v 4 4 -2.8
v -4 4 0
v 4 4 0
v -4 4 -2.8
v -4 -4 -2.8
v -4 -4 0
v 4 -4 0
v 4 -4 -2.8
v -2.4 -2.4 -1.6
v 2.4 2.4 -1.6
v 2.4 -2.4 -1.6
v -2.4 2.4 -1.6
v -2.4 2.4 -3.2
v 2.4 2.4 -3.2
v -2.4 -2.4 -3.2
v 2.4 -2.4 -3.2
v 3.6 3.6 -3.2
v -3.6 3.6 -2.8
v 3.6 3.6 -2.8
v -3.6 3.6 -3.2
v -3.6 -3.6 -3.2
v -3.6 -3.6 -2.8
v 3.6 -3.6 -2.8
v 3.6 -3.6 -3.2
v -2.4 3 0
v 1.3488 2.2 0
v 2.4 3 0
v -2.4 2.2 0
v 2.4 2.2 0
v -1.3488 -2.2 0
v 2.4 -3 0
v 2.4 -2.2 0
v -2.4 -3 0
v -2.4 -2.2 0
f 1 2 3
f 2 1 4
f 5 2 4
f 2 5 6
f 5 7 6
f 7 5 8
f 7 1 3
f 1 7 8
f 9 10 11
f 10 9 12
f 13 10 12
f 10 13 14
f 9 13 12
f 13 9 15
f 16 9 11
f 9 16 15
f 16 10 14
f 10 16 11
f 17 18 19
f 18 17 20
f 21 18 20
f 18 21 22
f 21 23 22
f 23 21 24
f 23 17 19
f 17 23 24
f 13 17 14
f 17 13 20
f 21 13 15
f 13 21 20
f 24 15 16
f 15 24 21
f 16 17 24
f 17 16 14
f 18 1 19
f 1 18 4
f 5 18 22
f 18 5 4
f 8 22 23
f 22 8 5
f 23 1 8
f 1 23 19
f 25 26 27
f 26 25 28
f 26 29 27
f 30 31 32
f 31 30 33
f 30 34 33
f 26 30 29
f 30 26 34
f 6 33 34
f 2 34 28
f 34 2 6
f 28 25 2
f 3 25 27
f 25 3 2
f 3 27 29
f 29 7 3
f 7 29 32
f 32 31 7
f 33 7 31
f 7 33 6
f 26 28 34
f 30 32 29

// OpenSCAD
// file: ../p/4-4edge.scad
use <../lib.scad>
$fa=1; $fs=0.2;
function ldraw_lib__4_4edge(realsolid=false) = [
// 0 Circle 1.0
// 0 Name: 4-4edge.dat
// 0 Author: James Jessiman
// 0 !LDRAW_ORG Primitive UPDATE 2017-01
// 0 !LICENSE Licensed under CC BY 2.0 and CC BY 4.0 : see CAreadme.txt
// 
// 0 BFC CERTIFY CCW
  [0,"BFC","CERTIFY"],
  [0,"BFC","CCW"],
// 
// 0 !HISTORY 1998-12-15 [PTadmin] Official Update 1998-10
// 0 !HISTORY 2005-12-28 [PTadmin] Official Update 2005-01
// 0 !HISTORY 2007-06-24 [PTadmin] Header formatted for Contributor Agreement
// 0 !HISTORY 2008-07-01 [PTadmin] Official Update 2008-01
// 0 !HISTORY 2017-01-15 [Steffen] BFCed
// 0 !HISTORY 2017-12-30 [PTadmin] Official Update 2017-01
// 
// 
// 2 24 1 0 0 0.9239 0 0.3827
  [2,24,1,0,0,0.9239,0,0.3827],
// 2 24 0.9239 0 0.3827 0.7071 0 0.7071
  [2,24,0.9239,0,0.3827,0.7071,0,0.7071],
// 2 24 0.7071 0 0.7071 0.3827 0 0.9239
  [2,24,0.7071,0,0.7071,0.3827,0,0.9239],
// 2 24 0.3827 0 0.9239 0 0 1
  [2,24,0.3827,0,0.9239,0,0,1],
// 2 24 0 0 1 -0.3827 0 0.9239
  [2,24,0,0,1,-0.3827,0,0.9239],
// 2 24 -0.3827 0 0.9239 -0.7071 0 0.7071
  [2,24,-0.3827,0,0.9239,-0.7071,0,0.7071],
// 2 24 -0.7071 0 0.7071 -0.9239 0 0.3827
  [2,24,-0.7071,0,0.7071,-0.9239,0,0.3827],
// 2 24 -0.9239 0 0.3827 -1 0 -0
  [2,24,-0.9239,0,0.3827,-1,0,-0],
// 2 24 -1 0 -0 -0.9239 0 -0.3827
  [2,24,-1,0,-0,-0.9239,0,-0.3827],
// 2 24 -0.9239 0 -0.3827 -0.7071 0 -0.7071
  [2,24,-0.9239,0,-0.3827,-0.7071,0,-0.7071],
// 2 24 -0.7071 0 -0.7071 -0.3827 0 -0.9239
  [2,24,-0.7071,0,-0.7071,-0.3827,0,-0.9239],
// 2 24 -0.3827 0 -0.9239 0 0 -1
  [2,24,-0.3827,0,-0.9239,0,0,-1],
// 2 24 0 0 -1 0.3827 0 -0.9239
  [2,24,0,0,-1,0.3827,0,-0.9239],
// 2 24 0.3827 0 -0.9239 0.7071 0 -0.7071
  [2,24,0.3827,0,-0.9239,0.7071,0,-0.7071],
// 2 24 0.7071 0 -0.7071 0.9239 0 -0.3827
  [2,24,0.7071,0,-0.7071,0.9239,0,-0.3827],
// 2 24 0.9239 0 -0.3827 1 0 0
  [2,24,0.9239,0,-0.3827,1,0,0],
];
module ldraw_lib__4_4edge(step=0, col=false, unit=2/5, alt=false, line=0.2, solid=!$preview)
    makepoly(ldraw_lib__4_4edge(solid), step=step, col=col, unit=unit, alt=alt, line=line, solid=solid);
ldraw_lib__4_4edge(line=0.2);
// file: ../p/4-4disc.scad
use <../lib.scad>
$fa=1; $fs=0.2;
function ldraw_lib__4_4disc(realsolid=false) = [
// 0 Disc 1.0
// 0 Name: 4-4disc.dat
// 0 Author: James Jessiman
// 0 !LDRAW_ORG Primitive UPDATE 2002-02
// 0 !LICENSE Licensed under CC BY 2.0 and CC BY 4.0 : see CAreadme.txt
// 
// 0 BFC CERTIFY CCW
  [0,"BFC","CERTIFY"],
  [0,"BFC","CCW"],
// 
// 0 !HISTORY 1998-12-15 [PTadmin] Official Update 1998-10
// 0 !HISTORY 2002-03-23 [sbliss] Added BFC statement
// 0 !HISTORY 2002-04-25 [PTadmin] Official Update 2002-02
// 0 !HISTORY 2007-06-24 [PTadmin] Header formatted for Contributor Agreement
// 0 !HISTORY 2008-07-01 [PTadmin] Official Update 2008-01
// 
// 
// 3 16 0 0 0 1 0 0 0.9239 0 0.3827
  [3,16,0,0,0,1,0,0,0.9239,0,0.3827],
// 3 16 0 0 0 0.9239 0 0.3827 0.7071 0 0.7071
  [3,16,0,0,0,0.9239,0,0.3827,0.7071,0,0.7071],
// 3 16 0 0 0 0.7071 0 0.7071 0.3827 0 0.9239
  [3,16,0,0,0,0.7071,0,0.7071,0.3827,0,0.9239],
// 3 16 0 0 0 0.3827 0 0.9239 0 0 1
  [3,16,0,0,0,0.3827,0,0.9239,0,0,1],
// 3 16 0 0 0 0 0 1 -0.3827 0 0.9239
  [3,16,0,0,0,0,0,1,-0.3827,0,0.9239],
// 3 16 0 0 0 -0.3827 0 0.9239 -0.7071 0 0.7071
  [3,16,0,0,0,-0.3827,0,0.9239,-0.7071,0,0.7071],
// 3 16 0 0 0 -0.7071 0 0.7071 -0.9239 0 0.3827
  [3,16,0,0,0,-0.7071,0,0.7071,-0.9239,0,0.3827],
// 3 16 0 0 0 -0.9239 0 0.3827 -1 0 -0
  [3,16,0,0,0,-0.9239,0,0.3827,-1,0,-0],
// 3 16 0 0 0 -1 0 -0 -0.9239 0 -0.3827
  [3,16,0,0,0,-1,0,-0,-0.9239,0,-0.3827],
// 3 16 0 0 0 -0.9239 0 -0.3827 -0.7071 0 -0.7071
  [3,16,0,0,0,-0.9239,0,-0.3827,-0.7071,0,-0.7071],
// 3 16 0 0 0 -0.7071 0 -0.7071 -0.3827 0 -0.9239
  [3,16,0,0,0,-0.7071,0,-0.7071,-0.3827,0,-0.9239],
// 3 16 0 0 0 -0.3827 0 -0.9239 0 0 -1
  [3,16,0,0,0,-0.3827,0,-0.9239,0,0,-1],
// 3 16 0 0 0 0 0 -1 0.3827 0 -0.9239
  [3,16,0,0,0,0,0,-1,0.3827,0,-0.9239],
// 3 16 0 0 0 0.3827 0 -0.9239 0.7071 0 -0.7071
  [3,16,0,0,0,0.3827,0,-0.9239,0.7071,0,-0.7071],
// 3 16 0 0 0 0.7071 0 -0.7071 0.9239 0 -0.3827
  [3,16,0,0,0,0.7071,0,-0.7071,0.9239,0,-0.3827],
// 3 16 0 0 0 0.9239 0 -0.3827 1 0 0
  [3,16,0,0,0,0.9239,0,-0.3827,1,0,0],
// 0
];
module ldraw_lib__4_4disc(step=0, col=false, unit=2/5, alt=false, line=0.2, solid=!$preview)
    makepoly(ldraw_lib__4_4disc(solid), step=step, col=col, unit=unit, alt=alt, line=line, solid=solid);
ldraw_lib__4_4disc(line=0.2);
// file: ../p/4-4cyli.scad
use <../lib.scad>
$fa=1; $fs=0.2;
function ldraw_lib__4_4cyli(realsolid=false) = [
// 0 Cylinder 1.0
// 0 Name: 4-4cyli.dat
// 0 Author: James Jessiman
// 0 !LDRAW_ORG Primitive UPDATE 2005-01
// 0 !LICENSE Licensed under CC BY 2.0 and CC BY 4.0 : see CAreadme.txt
// 
// 0 BFC CERTIFY CCW
  [0,"BFC","CERTIFY"],
  [0,"BFC","CCW"],
// 
// 0 !HISTORY 1998-12-15 [PTadmin] Official Update 1998-10
// 0 !HISTORY 2002-03-23 [sbliss] Added BFC statement; merged headers from files in distributions LDraw 0.27 and Complete.
// 0 !HISTORY 2002-04-25 [PTadmin] Official Update 2002-02
// 0 !HISTORY 2004-12-14 [guyvivan] BFC CCW
// 0 !HISTORY 2005-12-28 [PTadmin] Official Update 2005-01
// 0 !HISTORY 2007-06-24 [PTadmin] Header formatted for Contributor Agreement
// 0 !HISTORY 2008-07-01 [PTadmin] Official Update 2008-01
// 
// 
// 4 16 1 1 0 0.9239 1 0.3827 0.9239 0 0.3827 1 0 0
  [4,16,1,1,0,0.9239,1,0.3827,0.9239,0,0.3827,1,0,0],
// 5 24 1 0 0 1 1 0 0.9239 0 0.3827 0.9239 0 -0.3827
  [5,24,1,0,0,1,1,0,0.9239,0,0.3827,0.9239,0,-0.3827],
// 4 16 0.9239 1 0.3827 0.7071 1 0.7071 0.7071 0 0.7071 0.9239 0 0.3827
  [4,16,0.9239,1,0.3827,0.7071,1,0.7071,0.7071,0,0.7071,0.9239,0,0.3827],
// 5 24 0.9239 0 0.3827 0.9239 1 0.3827 0.7071 0 0.7071 1 0 0
  [5,24,0.9239,0,0.3827,0.9239,1,0.3827,0.7071,0,0.7071,1,0,0],
// 4 16 0.7071 1 0.7071 0.3827 1 0.9239 0.3827 0 0.9239 0.7071 0 0.7071
  [4,16,0.7071,1,0.7071,0.3827,1,0.9239,0.3827,0,0.9239,0.7071,0,0.7071],
// 5 24 0.7071 0 0.7071 0.7071 1 0.7071 0.3827 0 0.9239 0.9239 0 0.3827
  [5,24,0.7071,0,0.7071,0.7071,1,0.7071,0.3827,0,0.9239,0.9239,0,0.3827],
// 4 16 0.3827 1 0.9239 0 1 1 0 0 1 0.3827 0 0.9239
  [4,16,0.3827,1,0.9239,0,1,1,0,0,1,0.3827,0,0.9239],
// 5 24 0.3827 0 0.9239 0.3827 1 0.9239 0 0 1 0.7071 0 0.7071
  [5,24,0.3827,0,0.9239,0.3827,1,0.9239,0,0,1,0.7071,0,0.7071],
// 4 16 0 1 1 -0.3827 1 0.9239 -0.3827 0 0.9239 0 0 1
  [4,16,0,1,1,-0.3827,1,0.9239,-0.3827,0,0.9239,0,0,1],
// 5 24 0 0 1 0 1 1 -0.3827 0 0.9239 0.3827 0 0.9239
  [5,24,0,0,1,0,1,1,-0.3827,0,0.9239,0.3827,0,0.9239],
// 4 16 -0.3827 1 0.9239 -0.7071 1 0.7071 -0.7071 0 0.7071 -0.3827 0 0.9239
  [4,16,-0.3827,1,0.9239,-0.7071,1,0.7071,-0.7071,0,0.7071,-0.3827,0,0.9239],
// 5 24 -0.3827 0 0.9239 -0.3827 1 0.9239 -0.7071 0 0.7071 0 0 1
  [5,24,-0.3827,0,0.9239,-0.3827,1,0.9239,-0.7071,0,0.7071,0,0,1],
// 4 16 -0.7071 1 0.7071 -0.9239 1 0.3827 -0.9239 0 0.3827 -0.7071 0 0.7071
  [4,16,-0.7071,1,0.7071,-0.9239,1,0.3827,-0.9239,0,0.3827,-0.7071,0,0.7071],
// 5 24 -0.7071 0 0.7071 -0.7071 1 0.7071 -0.9239 0 0.3827 -0.3827 0 0.9239
  [5,24,-0.7071,0,0.7071,-0.7071,1,0.7071,-0.9239,0,0.3827,-0.3827,0,0.9239],
// 4 16 -0.9239 1 0.3827 -1 1 0 -1 0 0 -0.9239 0 0.3827
  [4,16,-0.9239,1,0.3827,-1,1,0,-1,0,0,-0.9239,0,0.3827],
// 5 24 -0.9239 0 0.3827 -0.9239 1 0.3827 -1 0 0 -0.7071 0 0.7071
  [5,24,-0.9239,0,0.3827,-0.9239,1,0.3827,-1,0,0,-0.7071,0,0.7071],
// 4 16 -1 1 0 -0.9239 1 -0.3827 -0.9239 0 -0.3827 -1 0 0
  [4,16,-1,1,0,-0.9239,1,-0.3827,-0.9239,0,-0.3827,-1,0,0],
// 5 24 -1 0 0 -1 1 0 -0.9239 0 -0.3827 -0.9239 0 0.3827
  [5,24,-1,0,0,-1,1,0,-0.9239,0,-0.3827,-0.9239,0,0.3827],
// 4 16 -0.9239 1 -0.3827 -0.7071 1 -0.7071 -0.7071 0 -0.7071 -0.9239 0 -0.3827
  [4,16,-0.9239,1,-0.3827,-0.7071,1,-0.7071,-0.7071,0,-0.7071,-0.9239,0,-0.3827],
// 5 24 -0.9239 0 -0.3827 -0.9239 1 -0.3827 -0.7071 0 -0.7071 -1 0 0
  [5,24,-0.9239,0,-0.3827,-0.9239,1,-0.3827,-0.7071,0,-0.7071,-1,0,0],
// 4 16 -0.7071 1 -0.7071 -0.3827 1 -0.9239 -0.3827 0 -0.9239 -0.7071 0 -0.7071
  [4,16,-0.7071,1,-0.7071,-0.3827,1,-0.9239,-0.3827,0,-0.9239,-0.7071,0,-0.7071],
// 5 24 -0.7071 0 -0.7071 -0.7071 1 -0.7071 -0.3827 0 -0.9239 -0.9239 0 -0.3827
  [5,24,-0.7071,0,-0.7071,-0.7071,1,-0.7071,-0.3827,0,-0.9239,-0.9239,0,-0.3827],
// 4 16 -0.3827 1 -0.9239 0 1 -1 0 0 -1 -0.3827 0 -0.9239
  [4,16,-0.3827,1,-0.9239,0,1,-1,0,0,-1,-0.3827,0,-0.9239],
// 5 24 -0.3827 0 -0.9239 -0.3827 1 -0.9239 0 0 -1 -0.7071 0 -0.7071
  [5,24,-0.3827,0,-0.9239,-0.3827,1,-0.9239,0,0,-1,-0.7071,0,-0.7071],
// 4 16 0 1 -1 0.3827 1 -0.9239 0.3827 0 -0.9239 0 0 -1
  [4,16,0,1,-1,0.3827,1,-0.9239,0.3827,0,-0.9239,0,0,-1],
// 5 24 0 0 -1 0 1 -1 0.3827 0 -0.9239 -0.3827 0 -0.9239
  [5,24,0,0,-1,0,1,-1,0.3827,0,-0.9239,-0.3827,0,-0.9239],
// 4 16 0.3827 1 -0.9239 0.7071 1 -0.7071 0.7071 0 -0.7071 0.3827 0 -0.9239
  [4,16,0.3827,1,-0.9239,0.7071,1,-0.7071,0.7071,0,-0.7071,0.3827,0,-0.9239],
// 5 24 0.3827 0 -0.9239 0.3827 1 -0.9239 0.7071 0 -0.7071 0 0 -1
  [5,24,0.3827,0,-0.9239,0.3827,1,-0.9239,0.7071,0,-0.7071,0,0,-1],
// 4 16 0.7071 1 -0.7071 0.9239 1 -0.3827 0.9239 0 -0.3827 0.7071 0 -0.7071
  [4,16,0.7071,1,-0.7071,0.9239,1,-0.3827,0.9239,0,-0.3827,0.7071,0,-0.7071],
// 5 24 0.7071 0 -0.7071 0.7071 1 -0.7071 0.9239 0 -0.3827 0.3827 0 -0.9239
  [5,24,0.7071,0,-0.7071,0.7071,1,-0.7071,0.9239,0,-0.3827,0.3827,0,-0.9239],
// 4 16 0.9239 1 -0.3827 1 1 0 1 0 0 0.9239 0 -0.3827
  [4,16,0.9239,1,-0.3827,1,1,0,1,0,0,0.9239,0,-0.3827],
// 5 24 0.9239 0 -0.3827 0.9239 1 -0.3827 1 0 0 0.7071 0 -0.7071
  [5,24,0.9239,0,-0.3827,0.9239,1,-0.3827,1,0,0,0.7071,0,-0.7071],
// 0
];
module ldraw_lib__4_4cyli(step=0, col=false, unit=2/5, alt=false, line=0.2, solid=!$preview)
    makepoly(ldraw_lib__4_4cyli(solid), step=step, col=col, unit=unit, alt=alt, line=line, solid=solid);
ldraw_lib__4_4cyli(line=0.2);
// file: ../p/stud3.scad
use <../lib.scad>
use <4-4cyli.scad>
use <4-4disc.scad>
use <4-4edge.scad>
$fa=1; $fs=0.2;
function ldraw_lib__stud3(realsolid=false) = realsolid ? 
    [openscad(translate([0,0,-eps()], o=cylinder(4+eps(), r=4)),2)] : [
// 0 Stud Tube Solid
// 0 Name: stud3.dat
// 0 Author: James Jessiman
// 0 !LDRAW_ORG Primitive UPDATE 2012-01
// 0 !LICENSE Licensed under CC BY 2.0 and CC BY 4.0 : see CAreadme.txt
// 
// 0 BFC CERTIFY CCW
  [0,"BFC","CERTIFY"],
  [0,"BFC","CCW"],
// 
// 0 !HISTORY 2002-04-04 [sbliss] Modified for BFC compliance
// 0 !HISTORY 2002-04-25 [PTadmin] Official Update 2002-02
// 0 !HISTORY 2007-06-24 [PTadmin] Header formatted for Contributor Agreement
// 0 !HISTORY 2008-07-01 [PTadmin] Official Update 2008-01
// 0 !HISTORY 2012-02-16 [Philo] Changed to CCW
// 0 !HISTORY 2012-03-30 [PTadmin] Official Update 2012-01
// 
// 
// 1 16 0 -4 0 4 0 0 0 1 0 0 0 4 4-4edge.dat
  [1,16,0,-4,0,4,0,0,0,1,0,0,0,4, ldraw_lib__4_4edge(realsolid)],
// 1 16 0 0 0 4 0 0 0 1 0 0 0 4 4-4edge.dat
  [1,16,0,0,0,4,0,0,0,1,0,0,0,4, ldraw_lib__4_4edge(realsolid)],
// 1 16 0 -4 0 4 0 0 0 1 0 0 0 4 4-4disc.dat
  [1,16,0,-4,0,4,0,0,0,1,0,0,0,4, ldraw_lib__4_4disc(realsolid)],
// 1 16 0 -4 0 4 0 0 0 4 0 0 0 4 4-4cyli.dat
  [1,16,0,-4,0,4,0,0,0,4,0,0,0,4, ldraw_lib__4_4cyli(realsolid)],
];
module ldraw_lib__stud3(step=0, col=false, unit=2/5, alt=false, line=0.2, solid=!$preview)
    makepoly(ldraw_lib__stud3(solid), step=step, col=col, unit=unit, alt=alt, line=line, solid=solid);
ldraw_lib__stud3(line=0.2);
// file: ../p/stud.scad
use <../lib.scad>
use <4-4cyli.scad>
use <4-4disc.scad>
use <4-4edge.scad>
$fa=1; $fs=0.2;
function ldraw_lib__stud(realsolid=false) = realsolid ? 
    [openscad(translate([0,0,-eps()], o=cylinder(4+eps(), r=6)),2)] : [
// 0 Stud
// 0 Name: stud.dat
// 0 Author: James Jessiman
// 0 !LDRAW_ORG Primitive UPDATE 2012-01
// 0 !LICENSE Licensed under CC BY 2.0 and CC BY 4.0 : see CAreadme.txt
// 
// 0 BFC CERTIFY CCW
  [0,"BFC","CERTIFY"],
  [0,"BFC","CCW"],
// 
// 0 !HISTORY 2002-04-04 [sbliss] Modified for BFC compliance
// 0 !HISTORY 2002-04-25 [PTadmin] Official Update 2002-02
// 0 !HISTORY 2007-06-24 [PTadmin] Header formatted for Contributor Agreement
// 0 !HISTORY 2008-07-01 [PTadmin] Official Update 2008-01
// 0 !HISTORY 2012-02-16 [Philo] Changed to CCW
// 0 !HISTORY 2012-03-30 [PTadmin] Official Update 2012-01
// 
// 
// 1 16 0 0 0 6 0 0 0 1 0 0 0 6 4-4edge.dat
  [1,16,0,0,0,6,0,0,0,1,0,0,0,6, ldraw_lib__4_4edge(realsolid)],
// 1 16 0 -4 0 6 0 0 0 1 0 0 0 6 4-4edge.dat
  [1,16,0,-4,0,6,0,0,0,1,0,0,0,6, ldraw_lib__4_4edge(realsolid)],
// 1 16 0 0 0 6 0 0 0 -4 0 0 0 6 4-4cyli.dat
  [1,16,0,0,0,6,0,0,0,-4,0,0,0,6, ldraw_lib__4_4cyli(realsolid)],
// 1 16 0 -4 0 6 0 0 0 1 0 0 0 6 4-4disc.dat
  [1,16,0,-4,0,6,0,0,0,1,0,0,0,6, ldraw_lib__4_4disc(realsolid)],
];
module ldraw_lib__stud(step=0, col=false, unit=2/5, alt=false, line=0.2, solid=!$preview)
    makepoly(ldraw_lib__stud(solid), step=step, col=col, unit=unit, alt=alt, line=line, solid=solid);
ldraw_lib__stud(line=0.2);
// file: ../p/box4t.scad
use <../lib.scad>
$fa=1; $fs=0.2;
function ldraw_lib__box4t(realsolid=false) = [
// 0 Box with 4 Adjacent Faces and All Edges
// 0 Name: box4t.dat
// 0 Author: Tore Eriksson [Tore_Eriksson]
// 0 !LDRAW_ORG Primitive UPDATE 2003-02
// 0 !LICENSE Licensed under CC BY 2.0 and CC BY 4.0 : see CAreadme.txt
// 
// 0 BFC CERTIFY CCW
  [0,"BFC","CERTIFY"],
  [0,"BFC","CCW"],
// 
// 0 !HISTORY 1997-09-29 [PTadmin] Official Update 1997-15
// 0 !HISTORY 2002-08-31 [izanette] Modified with WINDZ for BFC compliance
// 0 !HISTORY 2003-08-01 [PTadmin] Official Update 2003-02
// 0 !HISTORY 2007-06-24 [PTadmin] Header formatted for Contributor Agreement
// 0 !HISTORY 2008-07-01 [PTadmin] Official Update 2008-01
// 
// 
// 2 24 1 1 1 -1 1 1
  [2,24,1,1,1,-1,1,1],
// 2 24 -1 1 1 -1 1 -1
  [2,24,-1,1,1,-1,1,-1],
// 2 24 -1 1 -1 1 1 -1
  [2,24,-1,1,-1,1,1,-1],
// 2 24 1 1 -1 1 1 1
  [2,24,1,1,-1,1,1,1],
// 2 24 1 0 1 -1 0 1
  [2,24,1,0,1,-1,0,1],
// 2 24 -1 0 1 -1 0 -1
  [2,24,-1,0,1,-1,0,-1],
// 2 24 -1 0 -1 1 0 -1
  [2,24,-1,0,-1,1,0,-1],
// 2 24 1 0 -1 1 0 1
  [2,24,1,0,-1,1,0,1],
// 2 24 1 0 1 1 1 1
  [2,24,1,0,1,1,1,1],
// 2 24 -1 0 1 -1 1 1
  [2,24,-1,0,1,-1,1,1],
// 2 24 1 0 -1 1 1 -1
  [2,24,1,0,-1,1,1,-1],
// 2 24 -1 0 -1 -1 1 -1
  [2,24,-1,0,-1,-1,1,-1],
// 4 16 1 1 1 1 1 -1 -1 1 -1 -1 1 1
  [4,16,1,1,1,1,1,-1,-1,1,-1,-1,1,1],
// 4 16 1 1 1 -1 1 1 -1 0 1 1 0 1
  [4,16,1,1,1,-1,1,1,-1,0,1,1,0,1],
// 4 16 -1 1 1 -1 1 -1 -1 0 -1 -1 0 1
  [4,16,-1,1,1,-1,1,-1,-1,0,-1,-1,0,1],
// 0 4 16 -1 1 -1 -1 0 -1 1 0 -1 1 1 -1
// 4 16 1 1 -1 1 1 1 1 0 1 1 0 -1
  [4,16,1,1,-1,1,1,1,1,0,1,1,0,-1],
// 0
];
module ldraw_lib__box4t(step=0, col=false, unit=2/5, alt=false, line=0.2, solid=!$preview)
    makepoly(ldraw_lib__box4t(solid), step=step, col=col, unit=unit, alt=alt, line=line, solid=solid);
ldraw_lib__box4t(line=0.2);
// file: s/3004s01.scad
use <../../lib.scad>
use <../../p/box4t.scad>
use <../../p/box5.scad>
use <../../p/stud.scad>
use <../../p/stud3.scad>
$fa=1; $fs=0.2;
function ldraw_lib__s__3004s01(realsolid=false) = [
// 0 ~Brick  1 x  2 without Front Face
// 0 Name: s\3004s01.dat
// 0 Author: James Jessiman
// 0 !LDRAW_ORG Subpart UPDATE 2003-03
// 0 !LICENSE Licensed under CC BY 2.0 and CC BY 4.0 : see CAreadme.txt
// 
// 0 BFC CERTIFY CCW
  [0,"BFC","CERTIFY"],
  [0,"BFC","CCW"],
// 
// 0 !HISTORY 2003-09-07 [jriley] Subfiling, BFC
// 0 !HISTORY 2003-12-19 [PTadmin] Official Update 2003-03
// 0 !HISTORY 2007-08-29 [PTadmin] Header formatted for Contributor Agreement
// 0 !HISTORY 2008-07-01 [PTadmin] Official Update 2008-01
// 
// 
// 1 16 0 4 0 1 0 0 0 -5 0 0 0 1 stud3.dat
  [1,16,0,4,0,1,0,0,0,-5,0,0,0,1, ldraw_lib__stud3(realsolid)],
// 0 BFC INVERTNEXT
  [0,"BFC","INVERTNEXT"],
// 1 16 0 24 0 16 0 0 0 -20 0 0 0 6 box5.dat
  [1,16,0,24,0,16,0,0,0,-20,0,0,0,6, ldraw_lib__box5(realsolid)],
// 4 16 20 24 10 16 24 6 -16 24 6 -20 24 10
  [4,16,20,24,10,16,24,6,-16,24,6,-20,24,10],
// 4 16 -20 24 10 -16 24 6 -16 24 -6 -20 24 -10
  [4,16,-20,24,10,-16,24,6,-16,24,-6,-20,24,-10],
// 4 16 -20 24 -10 -16 24 -6 16 24 -6 20 24 -10
  [4,16,-20,24,-10,-16,24,-6,16,24,-6,20,24,-10],
// 4 16 20 24 -10 16 24 -6 16 24 6 20 24 10
  [4,16,20,24,-10,16,24,-6,16,24,6,20,24,10],
// 1 16 0 24 0 20 0 0 0 -24 0 0 0 10 box4t.dat
  [1,16,0,24,0,20,0,0,0,-24,0,0,0,10, ldraw_lib__box4t(realsolid)],
// 1 16 10 0 0 1 0 0 0 1 0 0 0 1 stud.dat
  [1,16,10,0,0,1,0,0,0,1,0,0,0,1, ldraw_lib__stud(realsolid)],
// 1 16 -10 0 0 1 0 0 0 1 0 0 0 1 stud.dat
  [1,16,-10,0,0,1,0,0,0,1,0,0,0,1, ldraw_lib__stud(realsolid)],
// 0
];
module ldraw_lib__s__3004s01(step=0, col=false, unit=2/5, alt=false, line=0.2, solid=!$preview)
    makepoly(ldraw_lib__s__3004s01(solid), step=step, col=col, unit=unit, alt=alt, line=line, solid=solid);
ldraw_lib__s__3004s01(line=0.2);
// file: ../p/box5.scad
use <../lib.scad>
$fa=1; $fs=0.2;
function ldraw_lib__box5(realsolid=false) = [
// 0 Box with 5 Faces and All Edges
// 0 Name: box5.dat
// 0 Author: James Jessiman
// 0 !LDRAW_ORG Primitive UPDATE 2012-01
// 0 !LICENSE Licensed under CC BY 2.0 and CC BY 4.0 : see CAreadme.txt
// 
// 0 BFC CERTIFY CCW
  [0,"BFC","CERTIFY"],
  [0,"BFC","CCW"],
// 
// 0 !HISTORY 2002-04-03 [sbliss] Modified for BFC compliance
// 0 !HISTORY 2002-04-25 [PTadmin] Official Update 2002-02
// 0 !HISTORY 2007-06-24 [PTadmin] Header formatted for Contributor Agreement
// 0 !HISTORY 2008-07-01 [PTadmin] Official Update 2008-01
// 0 !HISTORY 2012-02-16 [Philo] Changed to CCW
// 0 !HISTORY 2012-03-30 [PTadmin] Official Update 2012-01
// 
// 
// 2 24 1 1 1 -1 1 1
  [2,24,1,1,1,-1,1,1],
// 2 24 -1 1 1 -1 1 -1
  [2,24,-1,1,1,-1,1,-1],
// 2 24 -1 1 -1 1 1 -1
  [2,24,-1,1,-1,1,1,-1],
// 2 24 1 1 -1 1 1 1
  [2,24,1,1,-1,1,1,1],
// 2 24 1 0 1 -1 0 1
  [2,24,1,0,1,-1,0,1],
// 2 24 -1 0 1 -1 0 -1
  [2,24,-1,0,1,-1,0,-1],
// 2 24 -1 0 -1 1 0 -1
  [2,24,-1,0,-1,1,0,-1],
// 2 24 1 0 -1 1 0 1
  [2,24,1,0,-1,1,0,1],
// 2 24 1 0 1 1 1 1
  [2,24,1,0,1,1,1,1],
// 2 24 -1 0 1 -1 1 1
  [2,24,-1,0,1,-1,1,1],
// 2 24 1 0 -1 1 1 -1
  [2,24,1,0,-1,1,1,-1],
// 2 24 -1 0 -1 -1 1 -1
  [2,24,-1,0,-1,-1,1,-1],
// 4 16 -1 1 1 1 1 1 1 1 -1 -1 1 -1
  [4,16,-1,1,1,1,1,1,1,1,-1,-1,1,-1],
// 4 16 -1 1 1 -1 0 1 1 0 1 1 1 1
  [4,16,-1,1,1,-1,0,1,1,0,1,1,1,1],
// 4 16 -1 1 -1 -1 0 -1 -1 0 1 -1 1 1
  [4,16,-1,1,-1,-1,0,-1,-1,0,1,-1,1,1],
// 4 16 1 1 -1 1 0 -1 -1 0 -1 -1 1 -1
  [4,16,1,1,-1,1,0,-1,-1,0,-1,-1,1,-1],
// 4 16 1 1 1 1 0 1 1 0 -1 1 1 -1
  [4,16,1,1,1,1,0,1,1,0,-1,1,1,-1],
];
module ldraw_lib__box5(step=0, col=false, unit=2/5, alt=false, line=0.2, solid=!$preview)
    makepoly(ldraw_lib__box5(solid), step=step, col=col, unit=unit, alt=alt, line=line, solid=solid);
ldraw_lib__box5(line=0.2);
// file: ../p/box4.scad
use <../lib.scad>
$fa=1; $fs=0.2;
function ldraw_lib__box4(realsolid=false) = [
// 0 Box with 4 Faces (2 Parallel Pairs) and All Edges
// 0 Name: box4.dat
// 0 Author: James Jessiman
// 0 !LDRAW_ORG Primitive UPDATE 2012-01
// 0 !LICENSE Licensed under CC BY 2.0 and CC BY 4.0 : see CAreadme.txt
// 
// 0 BFC CERTIFY CCW
  [0,"BFC","CERTIFY"],
  [0,"BFC","CCW"],
// 
// 0 !HISTORY 2002-04-03 [sbliss] Modified for BFC compliance
// 0 !HISTORY 2002-04-25 [PTadmin] Official Update 2002-02
// 0 !HISTORY 2007-06-24 [PTadmin] Header formatted for Contributor Agreement
// 0 !HISTORY 2008-07-01 [PTadmin] Official Update 2008-01
// 0 !HISTORY 2012-02-16 [Philo] Changed to CCW
// 0 !HISTORY 2012-03-30 [PTadmin] Official Update 2012-01
// 
// 
// 2 24 1 1 1 -1 1 1
  [2,24,1,1,1,-1,1,1],
// 2 24 -1 1 1 -1 1 -1
  [2,24,-1,1,1,-1,1,-1],
// 2 24 -1 1 -1 1 1 -1
  [2,24,-1,1,-1,1,1,-1],
// 2 24 1 1 -1 1 1 1
  [2,24,1,1,-1,1,1,1],
// 2 24 1 0 1 -1 0 1
  [2,24,1,0,1,-1,0,1],
// 2 24 -1 0 1 -1 0 -1
  [2,24,-1,0,1,-1,0,-1],
// 2 24 -1 0 -1 1 0 -1
  [2,24,-1,0,-1,1,0,-1],
// 2 24 1 0 -1 1 0 1
  [2,24,1,0,-1,1,0,1],
// 2 24 1 0 1 1 1 1
  [2,24,1,0,1,1,1,1],
// 2 24 -1 0 1 -1 1 1
  [2,24,-1,0,1,-1,1,1],
// 2 24 1 0 -1 1 1 -1
  [2,24,1,0,-1,1,1,-1],
// 2 24 -1 0 -1 -1 1 -1
  [2,24,-1,0,-1,-1,1,-1],
// 4 16 -1 1 1 -1 0 1 1 0 1 1 1 1
  [4,16,-1,1,1,-1,0,1,1,0,1,1,1,1],
// 4 16 -1 1 -1 -1 0 -1 -1 0 1 -1 1 1
  [4,16,-1,1,-1,-1,0,-1,-1,0,1,-1,1,1],
// 4 16 1 1 -1 1 0 -1 -1 0 -1 -1 1 -1
  [4,16,1,1,-1,1,0,-1,-1,0,-1,-1,1,-1],
// 4 16 1 1 1 1 0 1 1 0 -1 1 1 -1
  [4,16,1,1,1,1,0,1,1,0,-1,1,1,-1],
];
module ldraw_lib__box4(step=0, col=false, unit=2/5, alt=false, line=0.2, solid=!$preview)
    makepoly(ldraw_lib__box4(solid), step=step, col=col, unit=unit, alt=alt, line=line, solid=solid);
ldraw_lib__box4(line=0.2);
// file: 3004.scad
use <../lib.scad>
use <s/3004s01.scad>
$fa=1; $fs=0.2;
function ldraw_lib__3004(realsolid=false) = [
// 0 Brick  1 x  2
// 0 Name: 3004.dat
// 0 Author: James Jessiman
// 0 !LDRAW_ORG Part UPDATE 2022-05
// 0 !LICENSE Licensed under CC BY 2.0 and CC BY 4.0 : see CAreadme.txt
// 
// 0 BFC CERTIFY CCW
  [0,"BFC","CERTIFY"],
  [0,"BFC","CCW"],
// 
// 0 !HISTORY 2001-10-26 [PTadmin] Official Update 2001-01
// 0 !HISTORY 2002-05-07 {unknown} BFC Certification
// 0 !HISTORY 2002-06-11 [PTadmin] Official Update 2002-03
// 0 !HISTORY 2007-05-07 [PTadmin] Header formatted for Contributor Agreement
// 0 !HISTORY 2008-07-01 [PTadmin] Official Update 2008-01
// 0 !HISTORY 2022-08-04 [MagFors] Using subfile
// 0 !HISTORY 2022-09-15 [PTadmin] Official Update 2022-05
// 
// 
// 1 16 0 0 0 1 0 0 0 1 0 0 0 1 s\3004s01.dat
  [1,16,0,0,0,1,0,0,0,1,0,0,0,1, ldraw_lib__s__3004s01(realsolid)],
// 4 16 -20 24 -10 20 24 -10 20 0 -10 -20 0 -10
  [4,16,-20,24,-10,20,24,-10,20,0,-10,-20,0,-10],
];
module ldraw_lib__3004(step=0, col=false, unit=2/5, alt=false, line=0.2, solid=!$preview)
    makepoly(ldraw_lib__3004(solid), step=step, col=col, unit=unit, alt=alt, line=line, solid=solid);
ldraw_lib__3004(line=0.2);
// file: s/3070bs01.scad
use <../../lib.scad>
use <../../p/box4.scad>
use <../../p/box5.scad>
$fa=1; $fs=0.2;
function ldraw_lib__s__3070bs01(realsolid=false) = [
// 0 ~Tile  1 x  1 with Groove without Top Face
// 0 Name: s\3070bs01.dat
// 0 Author: Chris Dee [cwdee]
// 0 !LDRAW_ORG Subpart UPDATE 2009-02
// 0 !LICENSE Licensed under CC BY 2.0 and CC BY 4.0 : see CAreadme.txt
// 
// 0 BFC CERTIFY CCW
  [0,"BFC","CERTIFY"],
  [0,"BFC","CCW"],
// 
// 0 !HISTORY 2009-09-03 [PTadmin] Official Update 2009-02
// 
// 
// 1 16 0 0 0 10 0 0 0 7 0 0 0 10 box4.dat
  [1,16,0,0,0,10,0,0,0,7,0,0,0,10, ldraw_lib__box4(realsolid)],
// 0 BFC INVERTNEXT
  [0,"BFC","INVERTNEXT"],
// 1 16 0 8 0 6 0 0 0 -4 0 0 0 6 box5.dat
  [1,16,0,8,0,6,0,0,0,-4,0,0,0,6, ldraw_lib__box5(realsolid)],
// 1 16 0 7 0 9 0 0 0 1 0 0 0 9 box4.dat
  [1,16,0,7,0,9,0,0,0,1,0,0,0,9, ldraw_lib__box4(realsolid)],
// 
// 4 16 9 8 9 6 8 6 -6 8 6 -9 8 9
  [4,16,9,8,9,6,8,6,-6,8,6,-9,8,9],
// 4 16 -9 8 9 -6 8 6 -6 8 -6 -9 8 -9
  [4,16,-9,8,9,-6,8,6,-6,8,-6,-9,8,-9],
// 4 16 -9 8 -9 -6 8 -6 6 8 -6 9 8 -9
  [4,16,-9,8,-9,-6,8,-6,6,8,-6,9,8,-9],
// 4 16 9 8 -9 6 8 -6 6 8 6 9 8 9
  [4,16,9,8,-9,6,8,-6,6,8,6,9,8,9],
// 
// 4 16 10 7 10 9 7 9 -9 7 9 -10 7 10
  [4,16,10,7,10,9,7,9,-9,7,9,-10,7,10],
// 4 16 -10 7 10 -9 7 9 -9 7 -9 -10 7 -10
  [4,16,-10,7,10,-9,7,9,-9,7,-9,-10,7,-10],
// 4 16 -10 7 -10 -9 7 -9 9 7 -9 10 7 -10
  [4,16,-10,7,-10,-9,7,-9,9,7,-9,10,7,-10],
// 4 16 10 7 -10 9 7 -9 9 7 9 10 7 10
  [4,16,10,7,-10,9,7,-9,9,7,9,10,7,10],
// 0
];
module ldraw_lib__s__3070bs01(step=0, col=false, unit=2/5, alt=false, line=0.2, solid=!$preview)
    makepoly(ldraw_lib__s__3070bs01(solid), step=step, col=col, unit=unit, alt=alt, line=line, solid=solid);
ldraw_lib__s__3070bs01(line=0.2);
// file: s/3070batz.scad
use <../../lib.scad>
$fa=1; $fs=0.2;
function ldraw_lib__s__3070batz(realsolid=false) = [
// 0 ~Tile  1 x  1 with "Z" Pattern
// 0 Name: s\3070batz.dat
// 0 Author: Chris Dee [cwdee]
// 0 !LDRAW_ORG Subpart UPDATE 2009-01
// 0 !LICENSE Licensed under CC BY 2.0 and CC BY 4.0 : see CAreadme.txt
// 
// 0 BFC CERTIFY CW
  [0,"BFC","CERTIFY"],
  [0,"BFC","CW"],
// 
// 0 !HISTORY 2009-05-02 [PTadmin] Official Update 2009-01
// 
// 
// 4 16 -6 0 5.5 -6 0 7.5 6 0 7.5 3.372 0 5.5
  [4,16,-6,0,5.5,-6,0,7.5,6,0,7.5,3.372,0,5.5],
// 3 16 6 0 7.5 6 0 5.5 3.372 0 5.5
  [3,16,6,0,7.5,6,0,5.5,3.372,0,5.5],
// 4 16 -6 0 -7.5 -3.372 0 -5.5 6 0 -5.5 6 0 -7.5
  [4,16,-6,0,-7.5,-3.372,0,-5.5,6,0,-5.5,6,0,-7.5],
// 3 16 -6 0 -7.5 -6 0 -5.5 -3.372 0 -5.5
  [3,16,-6,0,-7.5,-6,0,-5.5,-3.372,0,-5.5],
// 4 16 -3.372 0 -5.5 -6 0 -5.5 3.372 0 5.5 6 0 5.5
  [4,16,-3.372,0,-5.5,-6,0,-5.5,3.372,0,5.5,6,0,5.5],
// 0
];
module ldraw_lib__s__3070batz(step=0, col=false, unit=2/5, alt=false, line=0.2, solid=!$preview)
    makepoly(ldraw_lib__s__3070batz(solid), step=step, col=col, unit=unit, alt=alt, line=line, solid=solid);
ldraw_lib__s__3070batz(line=0.2);
// main file
use <../lib.scad>
use <s/3070batz.scad>
use <s/3070bs01.scad>
$fa=1; $fs=0.2;
function ldraw_lib__3070bptz(realsolid=false) = [
// 0 Tile  1 x  1 with Silver "Z" Pattern
// 0 Name: 3070bptz.dat
// 0 Author: Chris Dee [cwdee]
// 0 !LDRAW_ORG Part UPDATE 2013-01
// 0 !LICENSE Licensed under CC BY 2.0 and CC BY 4.0 : see CAreadme.txt
// 
// 0 BFC CERTIFY CW
  [0,"BFC","CERTIFY"],
  [0,"BFC","CW"],
// 
// 0 !HISTORY 2009-05-02 [PTadmin] Official Update 2009-01
// 0 !HISTORY 2013-03-09 [MagFors] Changed colour 383 to 80 (printed silver)
// 0 !HISTORY 2013-03-09 [MagFors] Removed t-junctions
// 0 !HISTORY 2013-07-21 [PTadmin] Official Update 2013-01
// 
// 
// 1 16 0 0 0 1 0 0 0 1 0 0 0 1 s\3070bs01.dat
  [1,16,0,0,0,1,0,0,0,1,0,0,0,1, ldraw_lib__s__3070bs01(realsolid)],
// 1 80 0 0 0 1 0 0 0 1 0 0 0 1 s\3070batz.dat
  [1,80,0,0,0,1,0,0,0,1,0,0,0,1, ldraw_lib__s__3070batz(realsolid)],
// 3 16 -6 0 -5.5 -6 0 -7.5 -10 0 -10
  [3,16,-6,0,-5.5,-6,0,-7.5,-10,0,-10],
// 4 16 -6 0 -5.5 -10 0 -10 -10 0 10 -6 0 5.5
  [4,16,-6,0,-5.5,-10,0,-10,-10,0,10,-6,0,5.5],
// 3 16 -10 0 10 -6 0 7.5 -6 0 5.5
  [3,16,-10,0,10,-6,0,7.5,-6,0,5.5],
// 4 16 -6 0 7.5 -10 0 10 10 0 10 6 0 7.5
  [4,16,-6,0,7.5,-10,0,10,10,0,10,6,0,7.5],
// 3 16 6 0 5.5 6 0 7.5 10 0 10
  [3,16,6,0,5.5,6,0,7.5,10,0,10],
// 4 16 6 0 5.5 10 0 10 10 0 -10 6 0 -5.5
  [4,16,6,0,5.5,10,0,10,10,0,-10,6,0,-5.5],
// 3 16 10 0 -10 6 0 -7.5 6 0 -5.5
  [3,16,10,0,-10,6,0,-7.5,6,0,-5.5],
// 4 16 6 0 -7.5 10 0 -10 -10 0 -10 -6 0 -7.5
  [4,16,6,0,-7.5,10,0,-10,-10,0,-10,-6,0,-7.5],
// 3 16 -6 0 -5.5 -6 0 5.5 3.372 0 5.5
  [3,16,-6,0,-5.5,-6,0,5.5,3.372,0,5.5],
// 3 16 6 0 5.5 6 0 -5.5 -3.372 0 -5.5
  [3,16,6,0,5.5,6,0,-5.5,-3.372,0,-5.5],
// 
];
module ldraw_lib__3070bptz(step=0, col=false, unit=2/5, alt=false, line=0.2, solid=!$preview)
    makepoly(ldraw_lib__3070bptz(solid), step=step, col=col, unit=unit, alt=alt, line=line, solid=solid);
ldraw_lib__3070bptz(line=0.2);
